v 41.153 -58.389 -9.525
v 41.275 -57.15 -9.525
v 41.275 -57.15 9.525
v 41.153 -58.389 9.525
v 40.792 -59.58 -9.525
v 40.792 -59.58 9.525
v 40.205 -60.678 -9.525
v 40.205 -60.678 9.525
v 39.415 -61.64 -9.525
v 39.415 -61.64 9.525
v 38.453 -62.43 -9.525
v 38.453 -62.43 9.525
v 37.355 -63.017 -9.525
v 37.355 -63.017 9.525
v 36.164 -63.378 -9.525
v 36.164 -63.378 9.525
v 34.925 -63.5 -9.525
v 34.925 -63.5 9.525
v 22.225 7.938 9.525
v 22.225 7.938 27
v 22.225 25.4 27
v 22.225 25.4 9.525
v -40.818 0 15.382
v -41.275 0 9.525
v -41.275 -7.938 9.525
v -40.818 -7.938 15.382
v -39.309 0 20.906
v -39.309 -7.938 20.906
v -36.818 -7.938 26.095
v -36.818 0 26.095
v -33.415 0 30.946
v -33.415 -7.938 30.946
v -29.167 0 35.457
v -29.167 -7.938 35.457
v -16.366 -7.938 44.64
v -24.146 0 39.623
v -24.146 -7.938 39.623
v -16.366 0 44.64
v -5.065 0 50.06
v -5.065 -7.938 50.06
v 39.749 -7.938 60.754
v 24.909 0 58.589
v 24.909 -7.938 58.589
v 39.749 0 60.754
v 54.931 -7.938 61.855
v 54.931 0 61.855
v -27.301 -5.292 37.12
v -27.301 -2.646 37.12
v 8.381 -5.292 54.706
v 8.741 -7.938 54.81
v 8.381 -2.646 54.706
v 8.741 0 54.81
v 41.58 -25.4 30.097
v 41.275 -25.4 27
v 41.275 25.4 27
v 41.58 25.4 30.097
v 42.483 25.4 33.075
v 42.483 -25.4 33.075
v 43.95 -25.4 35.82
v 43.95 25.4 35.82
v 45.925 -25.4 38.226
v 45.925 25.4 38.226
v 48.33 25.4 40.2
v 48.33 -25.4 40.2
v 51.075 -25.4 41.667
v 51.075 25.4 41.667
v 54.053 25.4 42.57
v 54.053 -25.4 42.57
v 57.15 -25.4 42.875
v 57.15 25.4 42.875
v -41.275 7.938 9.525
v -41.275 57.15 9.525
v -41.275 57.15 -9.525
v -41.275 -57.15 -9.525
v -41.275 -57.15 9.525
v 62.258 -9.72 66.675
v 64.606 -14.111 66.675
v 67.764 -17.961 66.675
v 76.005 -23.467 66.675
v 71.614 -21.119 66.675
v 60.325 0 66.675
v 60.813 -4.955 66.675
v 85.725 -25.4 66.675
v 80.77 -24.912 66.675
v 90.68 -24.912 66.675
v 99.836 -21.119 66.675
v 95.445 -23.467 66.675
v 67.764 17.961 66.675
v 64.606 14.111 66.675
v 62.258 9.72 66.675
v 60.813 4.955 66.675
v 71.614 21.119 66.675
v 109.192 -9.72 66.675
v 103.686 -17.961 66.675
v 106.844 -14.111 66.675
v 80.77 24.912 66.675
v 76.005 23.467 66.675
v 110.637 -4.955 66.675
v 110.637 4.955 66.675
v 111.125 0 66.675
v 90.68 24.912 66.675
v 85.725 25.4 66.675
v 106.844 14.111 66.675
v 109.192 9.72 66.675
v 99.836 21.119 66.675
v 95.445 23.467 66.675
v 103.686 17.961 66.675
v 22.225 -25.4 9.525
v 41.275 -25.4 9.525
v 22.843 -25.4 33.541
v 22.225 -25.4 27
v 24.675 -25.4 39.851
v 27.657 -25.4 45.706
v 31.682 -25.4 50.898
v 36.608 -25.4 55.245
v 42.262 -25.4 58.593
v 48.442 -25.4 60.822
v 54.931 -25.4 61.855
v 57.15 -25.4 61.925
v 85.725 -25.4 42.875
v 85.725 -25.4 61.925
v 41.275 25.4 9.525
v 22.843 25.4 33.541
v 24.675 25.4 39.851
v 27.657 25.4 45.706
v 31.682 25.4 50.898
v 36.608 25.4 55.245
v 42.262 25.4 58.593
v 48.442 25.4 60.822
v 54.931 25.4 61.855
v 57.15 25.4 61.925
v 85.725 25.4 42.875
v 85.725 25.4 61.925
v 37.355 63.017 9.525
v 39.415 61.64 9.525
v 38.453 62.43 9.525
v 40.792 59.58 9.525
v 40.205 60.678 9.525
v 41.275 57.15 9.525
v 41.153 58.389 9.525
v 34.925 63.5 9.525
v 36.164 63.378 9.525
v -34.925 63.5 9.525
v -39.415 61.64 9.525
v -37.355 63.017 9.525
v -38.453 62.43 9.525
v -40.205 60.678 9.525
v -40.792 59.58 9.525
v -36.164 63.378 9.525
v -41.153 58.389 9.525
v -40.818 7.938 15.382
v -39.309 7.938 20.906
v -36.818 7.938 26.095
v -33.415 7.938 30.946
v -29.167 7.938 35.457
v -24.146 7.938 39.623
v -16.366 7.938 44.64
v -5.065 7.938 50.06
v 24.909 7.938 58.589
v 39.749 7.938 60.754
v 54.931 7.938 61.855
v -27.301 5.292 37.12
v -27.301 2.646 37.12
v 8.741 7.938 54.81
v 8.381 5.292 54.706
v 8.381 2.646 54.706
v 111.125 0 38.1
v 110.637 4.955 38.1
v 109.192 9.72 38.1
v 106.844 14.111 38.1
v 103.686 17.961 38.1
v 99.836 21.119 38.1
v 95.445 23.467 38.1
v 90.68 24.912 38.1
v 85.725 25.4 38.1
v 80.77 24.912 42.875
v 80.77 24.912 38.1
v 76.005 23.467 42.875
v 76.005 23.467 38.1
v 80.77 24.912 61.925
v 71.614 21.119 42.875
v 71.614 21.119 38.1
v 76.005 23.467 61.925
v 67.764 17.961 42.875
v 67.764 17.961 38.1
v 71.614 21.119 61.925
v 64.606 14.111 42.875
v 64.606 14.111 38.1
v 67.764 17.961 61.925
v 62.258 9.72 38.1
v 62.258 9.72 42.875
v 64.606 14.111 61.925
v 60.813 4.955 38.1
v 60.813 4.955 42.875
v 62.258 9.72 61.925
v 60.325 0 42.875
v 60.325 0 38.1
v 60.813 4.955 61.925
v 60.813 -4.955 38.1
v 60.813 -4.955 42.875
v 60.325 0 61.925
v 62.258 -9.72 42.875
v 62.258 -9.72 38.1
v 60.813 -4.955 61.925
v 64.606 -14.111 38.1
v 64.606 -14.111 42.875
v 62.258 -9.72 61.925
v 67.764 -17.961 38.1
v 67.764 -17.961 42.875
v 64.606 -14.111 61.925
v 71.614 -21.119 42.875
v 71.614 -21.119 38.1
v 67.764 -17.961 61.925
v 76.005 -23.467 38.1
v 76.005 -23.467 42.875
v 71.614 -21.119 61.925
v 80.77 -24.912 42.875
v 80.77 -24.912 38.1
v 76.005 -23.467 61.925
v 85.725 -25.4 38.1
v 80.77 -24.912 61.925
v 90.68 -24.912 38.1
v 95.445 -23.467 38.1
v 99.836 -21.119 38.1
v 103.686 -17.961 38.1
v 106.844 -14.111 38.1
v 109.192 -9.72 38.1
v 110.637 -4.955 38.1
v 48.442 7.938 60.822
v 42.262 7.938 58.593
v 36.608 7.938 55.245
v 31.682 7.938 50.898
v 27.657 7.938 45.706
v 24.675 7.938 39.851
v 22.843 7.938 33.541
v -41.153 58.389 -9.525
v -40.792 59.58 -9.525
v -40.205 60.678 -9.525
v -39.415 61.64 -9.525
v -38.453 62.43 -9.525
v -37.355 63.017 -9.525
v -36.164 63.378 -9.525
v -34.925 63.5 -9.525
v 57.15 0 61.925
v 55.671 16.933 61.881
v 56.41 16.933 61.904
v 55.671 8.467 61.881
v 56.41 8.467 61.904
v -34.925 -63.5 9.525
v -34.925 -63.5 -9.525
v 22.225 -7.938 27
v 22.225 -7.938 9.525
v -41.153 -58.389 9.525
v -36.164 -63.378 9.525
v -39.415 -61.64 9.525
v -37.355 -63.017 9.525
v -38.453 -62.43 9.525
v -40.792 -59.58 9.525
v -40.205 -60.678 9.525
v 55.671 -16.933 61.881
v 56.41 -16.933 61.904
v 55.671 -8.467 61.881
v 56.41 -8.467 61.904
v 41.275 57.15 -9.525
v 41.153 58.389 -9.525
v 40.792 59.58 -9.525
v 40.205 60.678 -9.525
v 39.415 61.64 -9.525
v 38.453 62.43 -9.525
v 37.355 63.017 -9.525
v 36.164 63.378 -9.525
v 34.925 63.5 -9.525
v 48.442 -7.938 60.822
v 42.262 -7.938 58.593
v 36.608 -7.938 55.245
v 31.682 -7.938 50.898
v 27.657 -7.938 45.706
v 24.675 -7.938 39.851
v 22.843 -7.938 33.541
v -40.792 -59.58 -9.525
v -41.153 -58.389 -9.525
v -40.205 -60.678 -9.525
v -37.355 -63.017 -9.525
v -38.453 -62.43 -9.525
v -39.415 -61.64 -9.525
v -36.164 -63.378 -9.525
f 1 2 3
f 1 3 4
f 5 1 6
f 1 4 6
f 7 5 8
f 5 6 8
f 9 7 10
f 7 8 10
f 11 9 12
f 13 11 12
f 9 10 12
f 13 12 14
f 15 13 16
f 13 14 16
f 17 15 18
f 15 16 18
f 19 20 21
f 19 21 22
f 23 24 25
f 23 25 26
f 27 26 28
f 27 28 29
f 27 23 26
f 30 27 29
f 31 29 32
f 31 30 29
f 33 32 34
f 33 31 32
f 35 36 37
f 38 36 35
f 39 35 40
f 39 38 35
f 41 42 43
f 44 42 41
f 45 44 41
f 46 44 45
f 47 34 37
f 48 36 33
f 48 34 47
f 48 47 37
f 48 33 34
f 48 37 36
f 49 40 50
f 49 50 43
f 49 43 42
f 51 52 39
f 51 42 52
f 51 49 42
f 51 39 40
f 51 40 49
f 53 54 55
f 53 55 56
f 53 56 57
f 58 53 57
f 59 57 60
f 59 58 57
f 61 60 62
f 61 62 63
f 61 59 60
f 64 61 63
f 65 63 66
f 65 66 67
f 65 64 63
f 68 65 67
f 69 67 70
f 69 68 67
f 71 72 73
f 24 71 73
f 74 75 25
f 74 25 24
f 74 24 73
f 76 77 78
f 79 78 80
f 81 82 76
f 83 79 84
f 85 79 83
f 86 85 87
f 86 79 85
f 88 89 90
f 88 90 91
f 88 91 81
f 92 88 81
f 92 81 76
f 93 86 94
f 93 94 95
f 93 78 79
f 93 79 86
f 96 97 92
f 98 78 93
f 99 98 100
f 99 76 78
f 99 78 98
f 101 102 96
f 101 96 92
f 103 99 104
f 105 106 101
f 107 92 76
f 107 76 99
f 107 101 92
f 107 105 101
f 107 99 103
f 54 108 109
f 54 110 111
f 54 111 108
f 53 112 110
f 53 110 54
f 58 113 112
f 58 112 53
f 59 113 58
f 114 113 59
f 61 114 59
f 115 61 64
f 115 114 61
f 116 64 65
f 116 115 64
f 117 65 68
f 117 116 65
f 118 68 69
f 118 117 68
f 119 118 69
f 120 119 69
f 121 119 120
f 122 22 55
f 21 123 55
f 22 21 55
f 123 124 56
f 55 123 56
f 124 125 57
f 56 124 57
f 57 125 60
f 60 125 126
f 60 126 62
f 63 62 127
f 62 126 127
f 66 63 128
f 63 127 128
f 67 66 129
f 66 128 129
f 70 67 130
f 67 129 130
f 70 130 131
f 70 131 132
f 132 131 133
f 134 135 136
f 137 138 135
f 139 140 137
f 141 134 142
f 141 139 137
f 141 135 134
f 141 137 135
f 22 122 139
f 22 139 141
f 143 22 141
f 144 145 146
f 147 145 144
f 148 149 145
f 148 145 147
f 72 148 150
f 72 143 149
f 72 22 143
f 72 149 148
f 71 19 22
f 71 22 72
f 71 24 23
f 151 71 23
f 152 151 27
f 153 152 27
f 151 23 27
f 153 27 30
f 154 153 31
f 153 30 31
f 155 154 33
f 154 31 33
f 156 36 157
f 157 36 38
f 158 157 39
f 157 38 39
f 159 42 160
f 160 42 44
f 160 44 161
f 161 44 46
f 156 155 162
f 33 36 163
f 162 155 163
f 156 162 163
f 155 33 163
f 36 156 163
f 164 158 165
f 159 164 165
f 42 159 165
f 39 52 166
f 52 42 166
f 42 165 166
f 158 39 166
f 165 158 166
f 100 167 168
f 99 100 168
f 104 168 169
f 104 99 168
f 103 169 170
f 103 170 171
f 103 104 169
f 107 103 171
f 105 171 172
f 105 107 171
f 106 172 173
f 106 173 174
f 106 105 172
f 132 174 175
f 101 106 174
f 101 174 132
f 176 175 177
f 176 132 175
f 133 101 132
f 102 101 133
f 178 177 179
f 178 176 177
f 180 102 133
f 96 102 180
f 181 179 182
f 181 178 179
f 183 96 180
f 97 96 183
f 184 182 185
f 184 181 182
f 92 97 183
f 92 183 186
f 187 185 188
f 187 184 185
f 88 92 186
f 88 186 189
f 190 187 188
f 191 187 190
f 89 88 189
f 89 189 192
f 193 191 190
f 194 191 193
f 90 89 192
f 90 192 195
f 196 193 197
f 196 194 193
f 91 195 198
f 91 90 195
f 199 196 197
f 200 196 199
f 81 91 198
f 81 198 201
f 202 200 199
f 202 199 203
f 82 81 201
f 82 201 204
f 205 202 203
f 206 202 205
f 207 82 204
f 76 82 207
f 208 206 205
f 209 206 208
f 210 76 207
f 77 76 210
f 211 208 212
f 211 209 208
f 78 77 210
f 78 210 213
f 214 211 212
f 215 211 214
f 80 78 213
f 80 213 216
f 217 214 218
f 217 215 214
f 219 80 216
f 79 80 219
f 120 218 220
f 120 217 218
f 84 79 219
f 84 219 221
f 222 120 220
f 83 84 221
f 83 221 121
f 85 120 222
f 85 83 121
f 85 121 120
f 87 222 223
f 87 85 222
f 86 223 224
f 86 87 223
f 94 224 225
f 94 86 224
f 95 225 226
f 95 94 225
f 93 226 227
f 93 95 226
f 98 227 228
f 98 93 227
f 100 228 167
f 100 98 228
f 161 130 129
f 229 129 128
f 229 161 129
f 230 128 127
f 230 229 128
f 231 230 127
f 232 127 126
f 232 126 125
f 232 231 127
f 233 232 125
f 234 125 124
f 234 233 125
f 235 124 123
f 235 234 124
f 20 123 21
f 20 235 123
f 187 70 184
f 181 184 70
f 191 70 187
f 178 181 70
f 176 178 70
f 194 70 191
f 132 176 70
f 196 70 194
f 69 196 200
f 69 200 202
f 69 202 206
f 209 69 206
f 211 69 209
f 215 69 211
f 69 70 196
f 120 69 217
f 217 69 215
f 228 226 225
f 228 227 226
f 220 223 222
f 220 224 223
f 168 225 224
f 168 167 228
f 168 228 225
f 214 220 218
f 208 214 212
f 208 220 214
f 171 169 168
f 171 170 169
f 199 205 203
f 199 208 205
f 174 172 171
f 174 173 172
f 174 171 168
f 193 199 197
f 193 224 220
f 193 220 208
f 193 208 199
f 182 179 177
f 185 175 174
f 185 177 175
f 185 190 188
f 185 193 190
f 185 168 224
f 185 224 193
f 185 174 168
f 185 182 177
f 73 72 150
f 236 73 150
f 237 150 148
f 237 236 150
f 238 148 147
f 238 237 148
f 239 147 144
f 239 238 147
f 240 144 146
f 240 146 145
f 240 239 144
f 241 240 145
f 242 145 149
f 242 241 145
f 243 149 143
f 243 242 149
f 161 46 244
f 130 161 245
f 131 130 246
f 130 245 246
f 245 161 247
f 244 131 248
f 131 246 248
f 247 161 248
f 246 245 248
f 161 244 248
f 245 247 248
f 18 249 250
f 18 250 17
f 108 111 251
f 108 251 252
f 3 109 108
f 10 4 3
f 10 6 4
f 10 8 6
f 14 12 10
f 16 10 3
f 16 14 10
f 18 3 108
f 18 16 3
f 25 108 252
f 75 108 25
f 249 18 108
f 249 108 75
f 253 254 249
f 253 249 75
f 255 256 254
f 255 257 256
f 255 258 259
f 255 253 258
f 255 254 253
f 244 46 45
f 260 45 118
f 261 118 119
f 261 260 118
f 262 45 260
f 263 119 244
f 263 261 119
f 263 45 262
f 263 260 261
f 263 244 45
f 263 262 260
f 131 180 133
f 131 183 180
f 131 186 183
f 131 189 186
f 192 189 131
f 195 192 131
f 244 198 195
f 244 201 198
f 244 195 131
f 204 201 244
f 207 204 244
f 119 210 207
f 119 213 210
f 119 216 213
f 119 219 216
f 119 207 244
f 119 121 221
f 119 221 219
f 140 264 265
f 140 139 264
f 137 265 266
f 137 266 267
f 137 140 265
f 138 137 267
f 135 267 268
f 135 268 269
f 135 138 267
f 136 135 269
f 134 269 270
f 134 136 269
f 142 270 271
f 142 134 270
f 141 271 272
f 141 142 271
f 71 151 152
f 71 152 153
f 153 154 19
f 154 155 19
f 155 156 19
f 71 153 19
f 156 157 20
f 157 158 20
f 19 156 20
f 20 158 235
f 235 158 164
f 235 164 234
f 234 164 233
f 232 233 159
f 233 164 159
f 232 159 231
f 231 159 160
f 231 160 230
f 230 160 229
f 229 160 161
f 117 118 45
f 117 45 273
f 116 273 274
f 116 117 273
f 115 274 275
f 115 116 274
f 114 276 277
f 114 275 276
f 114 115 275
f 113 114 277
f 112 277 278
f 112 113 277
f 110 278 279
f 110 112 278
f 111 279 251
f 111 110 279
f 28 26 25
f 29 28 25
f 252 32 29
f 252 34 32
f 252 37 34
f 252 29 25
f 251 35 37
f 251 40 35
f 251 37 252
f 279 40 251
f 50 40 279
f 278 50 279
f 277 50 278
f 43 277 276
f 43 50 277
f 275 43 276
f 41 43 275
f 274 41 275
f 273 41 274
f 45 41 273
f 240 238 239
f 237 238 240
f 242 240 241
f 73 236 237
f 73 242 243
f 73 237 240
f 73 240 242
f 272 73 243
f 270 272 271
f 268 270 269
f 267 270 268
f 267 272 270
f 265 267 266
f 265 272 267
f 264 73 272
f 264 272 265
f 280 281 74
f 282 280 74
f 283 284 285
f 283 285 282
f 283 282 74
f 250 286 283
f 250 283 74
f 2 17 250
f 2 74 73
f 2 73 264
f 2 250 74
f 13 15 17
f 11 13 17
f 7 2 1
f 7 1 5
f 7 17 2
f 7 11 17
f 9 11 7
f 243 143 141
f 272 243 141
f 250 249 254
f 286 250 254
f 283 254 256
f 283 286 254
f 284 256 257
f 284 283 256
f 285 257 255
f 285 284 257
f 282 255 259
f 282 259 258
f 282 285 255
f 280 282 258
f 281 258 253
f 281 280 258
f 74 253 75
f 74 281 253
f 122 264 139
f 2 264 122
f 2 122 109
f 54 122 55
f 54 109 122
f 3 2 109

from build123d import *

# Parameters (mm, degrees)
F1_DEPTH = 63.5
F2_DEPTH = 7.9375
F0_W     = 25.4
F0_H     = 19.05
F3_DEPTH = 25.4
F5_R     = 6.35


with BuildPart() as f1:
    # F0 (on Front) → F1 (new body, symmetric)
    with BuildSketch(Plane.XZ):
        Polygon((41.275, -9.525), (41.275, 9.525), (22.225, 9.525), (-41.275, 9.525), (-41.275, -9.525), align=None)
    extrude(amount=F1_DEPTH, both=True)

    # F0 (on Front) → F2 (join, symmetric)
    with BuildSketch(Plane.XZ):
        with BuildLine():
            Line((-41.275, 9.525), (22.225, 9.525))
            Line((22.225, 9.525), (22.225, 27.0002))
            ThreePointArc((22.225, 27.0002), (31.6817510104, 50.8983990619), (54.9307362006, 61.8546185605))
            add(Edge.make_bspline(
                [(-41.275, 9.525), (-41.7675076432, 41.9812705622), (6.5603954345, 60.0669286801), (54.9307362006, 61.8546185605)],
                knots=[0, 0, 0, 0, 109.8248144815, 109.8248144815, 109.8248144815, 109.8248144815], degree=3))
        make_face()
    extrude(amount=F2_DEPTH, both=True)

    # F0 (on Front) → F3 (join, symmetric)
    with BuildSketch(Plane.XZ):
        with BuildLine():
            Line((22.225, 9.525), (41.275, 9.525))
            Line((41.275, 9.525), (41.275, 27.0002))
            ThreePointArc((41.275, 27.0002), (45.9246798487, 38.2255201513), (57.15, 42.8752))
            Line((57.15, 42.8752), (60.325, 42.8752))
            Line((60.325, 42.8752), (60.325, 61.9252))
            Line((60.325, 61.9252), (57.15, 61.9252))
            add(Edge.make_bspline(
                [(54.9307362006, 61.8546185605), (55.6705390451, 61.8819604819), (56.4103518168, 61.905489927), (57.15, 61.9252)],
                knots=[109.8248144815, 109.8248144815, 109.8248144815, 109.8248144815, 111.5045361635, 111.5045361635, 111.5045361635, 111.5045361635], degree=3))
            ThreePointArc((54.9307362006, 61.8546185605), (31.6817510104, 50.8983990619), (22.225, 27.0002))
            Line((22.225, 27.0002), (22.225, 9.525))
        make_face()
        with Locations((73.025, 52.4002)):
            Rectangle(F0_W, F0_H)
    extrude(amount=F3_DEPTH, both=True)

    # F0 (on Front) → F4 (revolve)
    with BuildSketch(Plane.XZ):
        Polygon((85.725, 61.9252), (85.725, 42.8752), (85.725, 38.1), (111.125, 38.1), (111.125, 66.675), (85.725, 66.675), align=None)
    revolve(axis=Axis((85.725, 0, 52.3875), (0, 0, 1)))

    # F5
    f5_edges = [f1.edges().sort_by_distance(p)[0] for p in [
        (41.275, -63.5, 0),
        (-41.275, -63.5, 0),
        (-41.275, 63.5, 0),
        (41.275, 63.5, 0),
    ]]
    fillet(f5_edges, radius=F5_R)


solid = f1.part
